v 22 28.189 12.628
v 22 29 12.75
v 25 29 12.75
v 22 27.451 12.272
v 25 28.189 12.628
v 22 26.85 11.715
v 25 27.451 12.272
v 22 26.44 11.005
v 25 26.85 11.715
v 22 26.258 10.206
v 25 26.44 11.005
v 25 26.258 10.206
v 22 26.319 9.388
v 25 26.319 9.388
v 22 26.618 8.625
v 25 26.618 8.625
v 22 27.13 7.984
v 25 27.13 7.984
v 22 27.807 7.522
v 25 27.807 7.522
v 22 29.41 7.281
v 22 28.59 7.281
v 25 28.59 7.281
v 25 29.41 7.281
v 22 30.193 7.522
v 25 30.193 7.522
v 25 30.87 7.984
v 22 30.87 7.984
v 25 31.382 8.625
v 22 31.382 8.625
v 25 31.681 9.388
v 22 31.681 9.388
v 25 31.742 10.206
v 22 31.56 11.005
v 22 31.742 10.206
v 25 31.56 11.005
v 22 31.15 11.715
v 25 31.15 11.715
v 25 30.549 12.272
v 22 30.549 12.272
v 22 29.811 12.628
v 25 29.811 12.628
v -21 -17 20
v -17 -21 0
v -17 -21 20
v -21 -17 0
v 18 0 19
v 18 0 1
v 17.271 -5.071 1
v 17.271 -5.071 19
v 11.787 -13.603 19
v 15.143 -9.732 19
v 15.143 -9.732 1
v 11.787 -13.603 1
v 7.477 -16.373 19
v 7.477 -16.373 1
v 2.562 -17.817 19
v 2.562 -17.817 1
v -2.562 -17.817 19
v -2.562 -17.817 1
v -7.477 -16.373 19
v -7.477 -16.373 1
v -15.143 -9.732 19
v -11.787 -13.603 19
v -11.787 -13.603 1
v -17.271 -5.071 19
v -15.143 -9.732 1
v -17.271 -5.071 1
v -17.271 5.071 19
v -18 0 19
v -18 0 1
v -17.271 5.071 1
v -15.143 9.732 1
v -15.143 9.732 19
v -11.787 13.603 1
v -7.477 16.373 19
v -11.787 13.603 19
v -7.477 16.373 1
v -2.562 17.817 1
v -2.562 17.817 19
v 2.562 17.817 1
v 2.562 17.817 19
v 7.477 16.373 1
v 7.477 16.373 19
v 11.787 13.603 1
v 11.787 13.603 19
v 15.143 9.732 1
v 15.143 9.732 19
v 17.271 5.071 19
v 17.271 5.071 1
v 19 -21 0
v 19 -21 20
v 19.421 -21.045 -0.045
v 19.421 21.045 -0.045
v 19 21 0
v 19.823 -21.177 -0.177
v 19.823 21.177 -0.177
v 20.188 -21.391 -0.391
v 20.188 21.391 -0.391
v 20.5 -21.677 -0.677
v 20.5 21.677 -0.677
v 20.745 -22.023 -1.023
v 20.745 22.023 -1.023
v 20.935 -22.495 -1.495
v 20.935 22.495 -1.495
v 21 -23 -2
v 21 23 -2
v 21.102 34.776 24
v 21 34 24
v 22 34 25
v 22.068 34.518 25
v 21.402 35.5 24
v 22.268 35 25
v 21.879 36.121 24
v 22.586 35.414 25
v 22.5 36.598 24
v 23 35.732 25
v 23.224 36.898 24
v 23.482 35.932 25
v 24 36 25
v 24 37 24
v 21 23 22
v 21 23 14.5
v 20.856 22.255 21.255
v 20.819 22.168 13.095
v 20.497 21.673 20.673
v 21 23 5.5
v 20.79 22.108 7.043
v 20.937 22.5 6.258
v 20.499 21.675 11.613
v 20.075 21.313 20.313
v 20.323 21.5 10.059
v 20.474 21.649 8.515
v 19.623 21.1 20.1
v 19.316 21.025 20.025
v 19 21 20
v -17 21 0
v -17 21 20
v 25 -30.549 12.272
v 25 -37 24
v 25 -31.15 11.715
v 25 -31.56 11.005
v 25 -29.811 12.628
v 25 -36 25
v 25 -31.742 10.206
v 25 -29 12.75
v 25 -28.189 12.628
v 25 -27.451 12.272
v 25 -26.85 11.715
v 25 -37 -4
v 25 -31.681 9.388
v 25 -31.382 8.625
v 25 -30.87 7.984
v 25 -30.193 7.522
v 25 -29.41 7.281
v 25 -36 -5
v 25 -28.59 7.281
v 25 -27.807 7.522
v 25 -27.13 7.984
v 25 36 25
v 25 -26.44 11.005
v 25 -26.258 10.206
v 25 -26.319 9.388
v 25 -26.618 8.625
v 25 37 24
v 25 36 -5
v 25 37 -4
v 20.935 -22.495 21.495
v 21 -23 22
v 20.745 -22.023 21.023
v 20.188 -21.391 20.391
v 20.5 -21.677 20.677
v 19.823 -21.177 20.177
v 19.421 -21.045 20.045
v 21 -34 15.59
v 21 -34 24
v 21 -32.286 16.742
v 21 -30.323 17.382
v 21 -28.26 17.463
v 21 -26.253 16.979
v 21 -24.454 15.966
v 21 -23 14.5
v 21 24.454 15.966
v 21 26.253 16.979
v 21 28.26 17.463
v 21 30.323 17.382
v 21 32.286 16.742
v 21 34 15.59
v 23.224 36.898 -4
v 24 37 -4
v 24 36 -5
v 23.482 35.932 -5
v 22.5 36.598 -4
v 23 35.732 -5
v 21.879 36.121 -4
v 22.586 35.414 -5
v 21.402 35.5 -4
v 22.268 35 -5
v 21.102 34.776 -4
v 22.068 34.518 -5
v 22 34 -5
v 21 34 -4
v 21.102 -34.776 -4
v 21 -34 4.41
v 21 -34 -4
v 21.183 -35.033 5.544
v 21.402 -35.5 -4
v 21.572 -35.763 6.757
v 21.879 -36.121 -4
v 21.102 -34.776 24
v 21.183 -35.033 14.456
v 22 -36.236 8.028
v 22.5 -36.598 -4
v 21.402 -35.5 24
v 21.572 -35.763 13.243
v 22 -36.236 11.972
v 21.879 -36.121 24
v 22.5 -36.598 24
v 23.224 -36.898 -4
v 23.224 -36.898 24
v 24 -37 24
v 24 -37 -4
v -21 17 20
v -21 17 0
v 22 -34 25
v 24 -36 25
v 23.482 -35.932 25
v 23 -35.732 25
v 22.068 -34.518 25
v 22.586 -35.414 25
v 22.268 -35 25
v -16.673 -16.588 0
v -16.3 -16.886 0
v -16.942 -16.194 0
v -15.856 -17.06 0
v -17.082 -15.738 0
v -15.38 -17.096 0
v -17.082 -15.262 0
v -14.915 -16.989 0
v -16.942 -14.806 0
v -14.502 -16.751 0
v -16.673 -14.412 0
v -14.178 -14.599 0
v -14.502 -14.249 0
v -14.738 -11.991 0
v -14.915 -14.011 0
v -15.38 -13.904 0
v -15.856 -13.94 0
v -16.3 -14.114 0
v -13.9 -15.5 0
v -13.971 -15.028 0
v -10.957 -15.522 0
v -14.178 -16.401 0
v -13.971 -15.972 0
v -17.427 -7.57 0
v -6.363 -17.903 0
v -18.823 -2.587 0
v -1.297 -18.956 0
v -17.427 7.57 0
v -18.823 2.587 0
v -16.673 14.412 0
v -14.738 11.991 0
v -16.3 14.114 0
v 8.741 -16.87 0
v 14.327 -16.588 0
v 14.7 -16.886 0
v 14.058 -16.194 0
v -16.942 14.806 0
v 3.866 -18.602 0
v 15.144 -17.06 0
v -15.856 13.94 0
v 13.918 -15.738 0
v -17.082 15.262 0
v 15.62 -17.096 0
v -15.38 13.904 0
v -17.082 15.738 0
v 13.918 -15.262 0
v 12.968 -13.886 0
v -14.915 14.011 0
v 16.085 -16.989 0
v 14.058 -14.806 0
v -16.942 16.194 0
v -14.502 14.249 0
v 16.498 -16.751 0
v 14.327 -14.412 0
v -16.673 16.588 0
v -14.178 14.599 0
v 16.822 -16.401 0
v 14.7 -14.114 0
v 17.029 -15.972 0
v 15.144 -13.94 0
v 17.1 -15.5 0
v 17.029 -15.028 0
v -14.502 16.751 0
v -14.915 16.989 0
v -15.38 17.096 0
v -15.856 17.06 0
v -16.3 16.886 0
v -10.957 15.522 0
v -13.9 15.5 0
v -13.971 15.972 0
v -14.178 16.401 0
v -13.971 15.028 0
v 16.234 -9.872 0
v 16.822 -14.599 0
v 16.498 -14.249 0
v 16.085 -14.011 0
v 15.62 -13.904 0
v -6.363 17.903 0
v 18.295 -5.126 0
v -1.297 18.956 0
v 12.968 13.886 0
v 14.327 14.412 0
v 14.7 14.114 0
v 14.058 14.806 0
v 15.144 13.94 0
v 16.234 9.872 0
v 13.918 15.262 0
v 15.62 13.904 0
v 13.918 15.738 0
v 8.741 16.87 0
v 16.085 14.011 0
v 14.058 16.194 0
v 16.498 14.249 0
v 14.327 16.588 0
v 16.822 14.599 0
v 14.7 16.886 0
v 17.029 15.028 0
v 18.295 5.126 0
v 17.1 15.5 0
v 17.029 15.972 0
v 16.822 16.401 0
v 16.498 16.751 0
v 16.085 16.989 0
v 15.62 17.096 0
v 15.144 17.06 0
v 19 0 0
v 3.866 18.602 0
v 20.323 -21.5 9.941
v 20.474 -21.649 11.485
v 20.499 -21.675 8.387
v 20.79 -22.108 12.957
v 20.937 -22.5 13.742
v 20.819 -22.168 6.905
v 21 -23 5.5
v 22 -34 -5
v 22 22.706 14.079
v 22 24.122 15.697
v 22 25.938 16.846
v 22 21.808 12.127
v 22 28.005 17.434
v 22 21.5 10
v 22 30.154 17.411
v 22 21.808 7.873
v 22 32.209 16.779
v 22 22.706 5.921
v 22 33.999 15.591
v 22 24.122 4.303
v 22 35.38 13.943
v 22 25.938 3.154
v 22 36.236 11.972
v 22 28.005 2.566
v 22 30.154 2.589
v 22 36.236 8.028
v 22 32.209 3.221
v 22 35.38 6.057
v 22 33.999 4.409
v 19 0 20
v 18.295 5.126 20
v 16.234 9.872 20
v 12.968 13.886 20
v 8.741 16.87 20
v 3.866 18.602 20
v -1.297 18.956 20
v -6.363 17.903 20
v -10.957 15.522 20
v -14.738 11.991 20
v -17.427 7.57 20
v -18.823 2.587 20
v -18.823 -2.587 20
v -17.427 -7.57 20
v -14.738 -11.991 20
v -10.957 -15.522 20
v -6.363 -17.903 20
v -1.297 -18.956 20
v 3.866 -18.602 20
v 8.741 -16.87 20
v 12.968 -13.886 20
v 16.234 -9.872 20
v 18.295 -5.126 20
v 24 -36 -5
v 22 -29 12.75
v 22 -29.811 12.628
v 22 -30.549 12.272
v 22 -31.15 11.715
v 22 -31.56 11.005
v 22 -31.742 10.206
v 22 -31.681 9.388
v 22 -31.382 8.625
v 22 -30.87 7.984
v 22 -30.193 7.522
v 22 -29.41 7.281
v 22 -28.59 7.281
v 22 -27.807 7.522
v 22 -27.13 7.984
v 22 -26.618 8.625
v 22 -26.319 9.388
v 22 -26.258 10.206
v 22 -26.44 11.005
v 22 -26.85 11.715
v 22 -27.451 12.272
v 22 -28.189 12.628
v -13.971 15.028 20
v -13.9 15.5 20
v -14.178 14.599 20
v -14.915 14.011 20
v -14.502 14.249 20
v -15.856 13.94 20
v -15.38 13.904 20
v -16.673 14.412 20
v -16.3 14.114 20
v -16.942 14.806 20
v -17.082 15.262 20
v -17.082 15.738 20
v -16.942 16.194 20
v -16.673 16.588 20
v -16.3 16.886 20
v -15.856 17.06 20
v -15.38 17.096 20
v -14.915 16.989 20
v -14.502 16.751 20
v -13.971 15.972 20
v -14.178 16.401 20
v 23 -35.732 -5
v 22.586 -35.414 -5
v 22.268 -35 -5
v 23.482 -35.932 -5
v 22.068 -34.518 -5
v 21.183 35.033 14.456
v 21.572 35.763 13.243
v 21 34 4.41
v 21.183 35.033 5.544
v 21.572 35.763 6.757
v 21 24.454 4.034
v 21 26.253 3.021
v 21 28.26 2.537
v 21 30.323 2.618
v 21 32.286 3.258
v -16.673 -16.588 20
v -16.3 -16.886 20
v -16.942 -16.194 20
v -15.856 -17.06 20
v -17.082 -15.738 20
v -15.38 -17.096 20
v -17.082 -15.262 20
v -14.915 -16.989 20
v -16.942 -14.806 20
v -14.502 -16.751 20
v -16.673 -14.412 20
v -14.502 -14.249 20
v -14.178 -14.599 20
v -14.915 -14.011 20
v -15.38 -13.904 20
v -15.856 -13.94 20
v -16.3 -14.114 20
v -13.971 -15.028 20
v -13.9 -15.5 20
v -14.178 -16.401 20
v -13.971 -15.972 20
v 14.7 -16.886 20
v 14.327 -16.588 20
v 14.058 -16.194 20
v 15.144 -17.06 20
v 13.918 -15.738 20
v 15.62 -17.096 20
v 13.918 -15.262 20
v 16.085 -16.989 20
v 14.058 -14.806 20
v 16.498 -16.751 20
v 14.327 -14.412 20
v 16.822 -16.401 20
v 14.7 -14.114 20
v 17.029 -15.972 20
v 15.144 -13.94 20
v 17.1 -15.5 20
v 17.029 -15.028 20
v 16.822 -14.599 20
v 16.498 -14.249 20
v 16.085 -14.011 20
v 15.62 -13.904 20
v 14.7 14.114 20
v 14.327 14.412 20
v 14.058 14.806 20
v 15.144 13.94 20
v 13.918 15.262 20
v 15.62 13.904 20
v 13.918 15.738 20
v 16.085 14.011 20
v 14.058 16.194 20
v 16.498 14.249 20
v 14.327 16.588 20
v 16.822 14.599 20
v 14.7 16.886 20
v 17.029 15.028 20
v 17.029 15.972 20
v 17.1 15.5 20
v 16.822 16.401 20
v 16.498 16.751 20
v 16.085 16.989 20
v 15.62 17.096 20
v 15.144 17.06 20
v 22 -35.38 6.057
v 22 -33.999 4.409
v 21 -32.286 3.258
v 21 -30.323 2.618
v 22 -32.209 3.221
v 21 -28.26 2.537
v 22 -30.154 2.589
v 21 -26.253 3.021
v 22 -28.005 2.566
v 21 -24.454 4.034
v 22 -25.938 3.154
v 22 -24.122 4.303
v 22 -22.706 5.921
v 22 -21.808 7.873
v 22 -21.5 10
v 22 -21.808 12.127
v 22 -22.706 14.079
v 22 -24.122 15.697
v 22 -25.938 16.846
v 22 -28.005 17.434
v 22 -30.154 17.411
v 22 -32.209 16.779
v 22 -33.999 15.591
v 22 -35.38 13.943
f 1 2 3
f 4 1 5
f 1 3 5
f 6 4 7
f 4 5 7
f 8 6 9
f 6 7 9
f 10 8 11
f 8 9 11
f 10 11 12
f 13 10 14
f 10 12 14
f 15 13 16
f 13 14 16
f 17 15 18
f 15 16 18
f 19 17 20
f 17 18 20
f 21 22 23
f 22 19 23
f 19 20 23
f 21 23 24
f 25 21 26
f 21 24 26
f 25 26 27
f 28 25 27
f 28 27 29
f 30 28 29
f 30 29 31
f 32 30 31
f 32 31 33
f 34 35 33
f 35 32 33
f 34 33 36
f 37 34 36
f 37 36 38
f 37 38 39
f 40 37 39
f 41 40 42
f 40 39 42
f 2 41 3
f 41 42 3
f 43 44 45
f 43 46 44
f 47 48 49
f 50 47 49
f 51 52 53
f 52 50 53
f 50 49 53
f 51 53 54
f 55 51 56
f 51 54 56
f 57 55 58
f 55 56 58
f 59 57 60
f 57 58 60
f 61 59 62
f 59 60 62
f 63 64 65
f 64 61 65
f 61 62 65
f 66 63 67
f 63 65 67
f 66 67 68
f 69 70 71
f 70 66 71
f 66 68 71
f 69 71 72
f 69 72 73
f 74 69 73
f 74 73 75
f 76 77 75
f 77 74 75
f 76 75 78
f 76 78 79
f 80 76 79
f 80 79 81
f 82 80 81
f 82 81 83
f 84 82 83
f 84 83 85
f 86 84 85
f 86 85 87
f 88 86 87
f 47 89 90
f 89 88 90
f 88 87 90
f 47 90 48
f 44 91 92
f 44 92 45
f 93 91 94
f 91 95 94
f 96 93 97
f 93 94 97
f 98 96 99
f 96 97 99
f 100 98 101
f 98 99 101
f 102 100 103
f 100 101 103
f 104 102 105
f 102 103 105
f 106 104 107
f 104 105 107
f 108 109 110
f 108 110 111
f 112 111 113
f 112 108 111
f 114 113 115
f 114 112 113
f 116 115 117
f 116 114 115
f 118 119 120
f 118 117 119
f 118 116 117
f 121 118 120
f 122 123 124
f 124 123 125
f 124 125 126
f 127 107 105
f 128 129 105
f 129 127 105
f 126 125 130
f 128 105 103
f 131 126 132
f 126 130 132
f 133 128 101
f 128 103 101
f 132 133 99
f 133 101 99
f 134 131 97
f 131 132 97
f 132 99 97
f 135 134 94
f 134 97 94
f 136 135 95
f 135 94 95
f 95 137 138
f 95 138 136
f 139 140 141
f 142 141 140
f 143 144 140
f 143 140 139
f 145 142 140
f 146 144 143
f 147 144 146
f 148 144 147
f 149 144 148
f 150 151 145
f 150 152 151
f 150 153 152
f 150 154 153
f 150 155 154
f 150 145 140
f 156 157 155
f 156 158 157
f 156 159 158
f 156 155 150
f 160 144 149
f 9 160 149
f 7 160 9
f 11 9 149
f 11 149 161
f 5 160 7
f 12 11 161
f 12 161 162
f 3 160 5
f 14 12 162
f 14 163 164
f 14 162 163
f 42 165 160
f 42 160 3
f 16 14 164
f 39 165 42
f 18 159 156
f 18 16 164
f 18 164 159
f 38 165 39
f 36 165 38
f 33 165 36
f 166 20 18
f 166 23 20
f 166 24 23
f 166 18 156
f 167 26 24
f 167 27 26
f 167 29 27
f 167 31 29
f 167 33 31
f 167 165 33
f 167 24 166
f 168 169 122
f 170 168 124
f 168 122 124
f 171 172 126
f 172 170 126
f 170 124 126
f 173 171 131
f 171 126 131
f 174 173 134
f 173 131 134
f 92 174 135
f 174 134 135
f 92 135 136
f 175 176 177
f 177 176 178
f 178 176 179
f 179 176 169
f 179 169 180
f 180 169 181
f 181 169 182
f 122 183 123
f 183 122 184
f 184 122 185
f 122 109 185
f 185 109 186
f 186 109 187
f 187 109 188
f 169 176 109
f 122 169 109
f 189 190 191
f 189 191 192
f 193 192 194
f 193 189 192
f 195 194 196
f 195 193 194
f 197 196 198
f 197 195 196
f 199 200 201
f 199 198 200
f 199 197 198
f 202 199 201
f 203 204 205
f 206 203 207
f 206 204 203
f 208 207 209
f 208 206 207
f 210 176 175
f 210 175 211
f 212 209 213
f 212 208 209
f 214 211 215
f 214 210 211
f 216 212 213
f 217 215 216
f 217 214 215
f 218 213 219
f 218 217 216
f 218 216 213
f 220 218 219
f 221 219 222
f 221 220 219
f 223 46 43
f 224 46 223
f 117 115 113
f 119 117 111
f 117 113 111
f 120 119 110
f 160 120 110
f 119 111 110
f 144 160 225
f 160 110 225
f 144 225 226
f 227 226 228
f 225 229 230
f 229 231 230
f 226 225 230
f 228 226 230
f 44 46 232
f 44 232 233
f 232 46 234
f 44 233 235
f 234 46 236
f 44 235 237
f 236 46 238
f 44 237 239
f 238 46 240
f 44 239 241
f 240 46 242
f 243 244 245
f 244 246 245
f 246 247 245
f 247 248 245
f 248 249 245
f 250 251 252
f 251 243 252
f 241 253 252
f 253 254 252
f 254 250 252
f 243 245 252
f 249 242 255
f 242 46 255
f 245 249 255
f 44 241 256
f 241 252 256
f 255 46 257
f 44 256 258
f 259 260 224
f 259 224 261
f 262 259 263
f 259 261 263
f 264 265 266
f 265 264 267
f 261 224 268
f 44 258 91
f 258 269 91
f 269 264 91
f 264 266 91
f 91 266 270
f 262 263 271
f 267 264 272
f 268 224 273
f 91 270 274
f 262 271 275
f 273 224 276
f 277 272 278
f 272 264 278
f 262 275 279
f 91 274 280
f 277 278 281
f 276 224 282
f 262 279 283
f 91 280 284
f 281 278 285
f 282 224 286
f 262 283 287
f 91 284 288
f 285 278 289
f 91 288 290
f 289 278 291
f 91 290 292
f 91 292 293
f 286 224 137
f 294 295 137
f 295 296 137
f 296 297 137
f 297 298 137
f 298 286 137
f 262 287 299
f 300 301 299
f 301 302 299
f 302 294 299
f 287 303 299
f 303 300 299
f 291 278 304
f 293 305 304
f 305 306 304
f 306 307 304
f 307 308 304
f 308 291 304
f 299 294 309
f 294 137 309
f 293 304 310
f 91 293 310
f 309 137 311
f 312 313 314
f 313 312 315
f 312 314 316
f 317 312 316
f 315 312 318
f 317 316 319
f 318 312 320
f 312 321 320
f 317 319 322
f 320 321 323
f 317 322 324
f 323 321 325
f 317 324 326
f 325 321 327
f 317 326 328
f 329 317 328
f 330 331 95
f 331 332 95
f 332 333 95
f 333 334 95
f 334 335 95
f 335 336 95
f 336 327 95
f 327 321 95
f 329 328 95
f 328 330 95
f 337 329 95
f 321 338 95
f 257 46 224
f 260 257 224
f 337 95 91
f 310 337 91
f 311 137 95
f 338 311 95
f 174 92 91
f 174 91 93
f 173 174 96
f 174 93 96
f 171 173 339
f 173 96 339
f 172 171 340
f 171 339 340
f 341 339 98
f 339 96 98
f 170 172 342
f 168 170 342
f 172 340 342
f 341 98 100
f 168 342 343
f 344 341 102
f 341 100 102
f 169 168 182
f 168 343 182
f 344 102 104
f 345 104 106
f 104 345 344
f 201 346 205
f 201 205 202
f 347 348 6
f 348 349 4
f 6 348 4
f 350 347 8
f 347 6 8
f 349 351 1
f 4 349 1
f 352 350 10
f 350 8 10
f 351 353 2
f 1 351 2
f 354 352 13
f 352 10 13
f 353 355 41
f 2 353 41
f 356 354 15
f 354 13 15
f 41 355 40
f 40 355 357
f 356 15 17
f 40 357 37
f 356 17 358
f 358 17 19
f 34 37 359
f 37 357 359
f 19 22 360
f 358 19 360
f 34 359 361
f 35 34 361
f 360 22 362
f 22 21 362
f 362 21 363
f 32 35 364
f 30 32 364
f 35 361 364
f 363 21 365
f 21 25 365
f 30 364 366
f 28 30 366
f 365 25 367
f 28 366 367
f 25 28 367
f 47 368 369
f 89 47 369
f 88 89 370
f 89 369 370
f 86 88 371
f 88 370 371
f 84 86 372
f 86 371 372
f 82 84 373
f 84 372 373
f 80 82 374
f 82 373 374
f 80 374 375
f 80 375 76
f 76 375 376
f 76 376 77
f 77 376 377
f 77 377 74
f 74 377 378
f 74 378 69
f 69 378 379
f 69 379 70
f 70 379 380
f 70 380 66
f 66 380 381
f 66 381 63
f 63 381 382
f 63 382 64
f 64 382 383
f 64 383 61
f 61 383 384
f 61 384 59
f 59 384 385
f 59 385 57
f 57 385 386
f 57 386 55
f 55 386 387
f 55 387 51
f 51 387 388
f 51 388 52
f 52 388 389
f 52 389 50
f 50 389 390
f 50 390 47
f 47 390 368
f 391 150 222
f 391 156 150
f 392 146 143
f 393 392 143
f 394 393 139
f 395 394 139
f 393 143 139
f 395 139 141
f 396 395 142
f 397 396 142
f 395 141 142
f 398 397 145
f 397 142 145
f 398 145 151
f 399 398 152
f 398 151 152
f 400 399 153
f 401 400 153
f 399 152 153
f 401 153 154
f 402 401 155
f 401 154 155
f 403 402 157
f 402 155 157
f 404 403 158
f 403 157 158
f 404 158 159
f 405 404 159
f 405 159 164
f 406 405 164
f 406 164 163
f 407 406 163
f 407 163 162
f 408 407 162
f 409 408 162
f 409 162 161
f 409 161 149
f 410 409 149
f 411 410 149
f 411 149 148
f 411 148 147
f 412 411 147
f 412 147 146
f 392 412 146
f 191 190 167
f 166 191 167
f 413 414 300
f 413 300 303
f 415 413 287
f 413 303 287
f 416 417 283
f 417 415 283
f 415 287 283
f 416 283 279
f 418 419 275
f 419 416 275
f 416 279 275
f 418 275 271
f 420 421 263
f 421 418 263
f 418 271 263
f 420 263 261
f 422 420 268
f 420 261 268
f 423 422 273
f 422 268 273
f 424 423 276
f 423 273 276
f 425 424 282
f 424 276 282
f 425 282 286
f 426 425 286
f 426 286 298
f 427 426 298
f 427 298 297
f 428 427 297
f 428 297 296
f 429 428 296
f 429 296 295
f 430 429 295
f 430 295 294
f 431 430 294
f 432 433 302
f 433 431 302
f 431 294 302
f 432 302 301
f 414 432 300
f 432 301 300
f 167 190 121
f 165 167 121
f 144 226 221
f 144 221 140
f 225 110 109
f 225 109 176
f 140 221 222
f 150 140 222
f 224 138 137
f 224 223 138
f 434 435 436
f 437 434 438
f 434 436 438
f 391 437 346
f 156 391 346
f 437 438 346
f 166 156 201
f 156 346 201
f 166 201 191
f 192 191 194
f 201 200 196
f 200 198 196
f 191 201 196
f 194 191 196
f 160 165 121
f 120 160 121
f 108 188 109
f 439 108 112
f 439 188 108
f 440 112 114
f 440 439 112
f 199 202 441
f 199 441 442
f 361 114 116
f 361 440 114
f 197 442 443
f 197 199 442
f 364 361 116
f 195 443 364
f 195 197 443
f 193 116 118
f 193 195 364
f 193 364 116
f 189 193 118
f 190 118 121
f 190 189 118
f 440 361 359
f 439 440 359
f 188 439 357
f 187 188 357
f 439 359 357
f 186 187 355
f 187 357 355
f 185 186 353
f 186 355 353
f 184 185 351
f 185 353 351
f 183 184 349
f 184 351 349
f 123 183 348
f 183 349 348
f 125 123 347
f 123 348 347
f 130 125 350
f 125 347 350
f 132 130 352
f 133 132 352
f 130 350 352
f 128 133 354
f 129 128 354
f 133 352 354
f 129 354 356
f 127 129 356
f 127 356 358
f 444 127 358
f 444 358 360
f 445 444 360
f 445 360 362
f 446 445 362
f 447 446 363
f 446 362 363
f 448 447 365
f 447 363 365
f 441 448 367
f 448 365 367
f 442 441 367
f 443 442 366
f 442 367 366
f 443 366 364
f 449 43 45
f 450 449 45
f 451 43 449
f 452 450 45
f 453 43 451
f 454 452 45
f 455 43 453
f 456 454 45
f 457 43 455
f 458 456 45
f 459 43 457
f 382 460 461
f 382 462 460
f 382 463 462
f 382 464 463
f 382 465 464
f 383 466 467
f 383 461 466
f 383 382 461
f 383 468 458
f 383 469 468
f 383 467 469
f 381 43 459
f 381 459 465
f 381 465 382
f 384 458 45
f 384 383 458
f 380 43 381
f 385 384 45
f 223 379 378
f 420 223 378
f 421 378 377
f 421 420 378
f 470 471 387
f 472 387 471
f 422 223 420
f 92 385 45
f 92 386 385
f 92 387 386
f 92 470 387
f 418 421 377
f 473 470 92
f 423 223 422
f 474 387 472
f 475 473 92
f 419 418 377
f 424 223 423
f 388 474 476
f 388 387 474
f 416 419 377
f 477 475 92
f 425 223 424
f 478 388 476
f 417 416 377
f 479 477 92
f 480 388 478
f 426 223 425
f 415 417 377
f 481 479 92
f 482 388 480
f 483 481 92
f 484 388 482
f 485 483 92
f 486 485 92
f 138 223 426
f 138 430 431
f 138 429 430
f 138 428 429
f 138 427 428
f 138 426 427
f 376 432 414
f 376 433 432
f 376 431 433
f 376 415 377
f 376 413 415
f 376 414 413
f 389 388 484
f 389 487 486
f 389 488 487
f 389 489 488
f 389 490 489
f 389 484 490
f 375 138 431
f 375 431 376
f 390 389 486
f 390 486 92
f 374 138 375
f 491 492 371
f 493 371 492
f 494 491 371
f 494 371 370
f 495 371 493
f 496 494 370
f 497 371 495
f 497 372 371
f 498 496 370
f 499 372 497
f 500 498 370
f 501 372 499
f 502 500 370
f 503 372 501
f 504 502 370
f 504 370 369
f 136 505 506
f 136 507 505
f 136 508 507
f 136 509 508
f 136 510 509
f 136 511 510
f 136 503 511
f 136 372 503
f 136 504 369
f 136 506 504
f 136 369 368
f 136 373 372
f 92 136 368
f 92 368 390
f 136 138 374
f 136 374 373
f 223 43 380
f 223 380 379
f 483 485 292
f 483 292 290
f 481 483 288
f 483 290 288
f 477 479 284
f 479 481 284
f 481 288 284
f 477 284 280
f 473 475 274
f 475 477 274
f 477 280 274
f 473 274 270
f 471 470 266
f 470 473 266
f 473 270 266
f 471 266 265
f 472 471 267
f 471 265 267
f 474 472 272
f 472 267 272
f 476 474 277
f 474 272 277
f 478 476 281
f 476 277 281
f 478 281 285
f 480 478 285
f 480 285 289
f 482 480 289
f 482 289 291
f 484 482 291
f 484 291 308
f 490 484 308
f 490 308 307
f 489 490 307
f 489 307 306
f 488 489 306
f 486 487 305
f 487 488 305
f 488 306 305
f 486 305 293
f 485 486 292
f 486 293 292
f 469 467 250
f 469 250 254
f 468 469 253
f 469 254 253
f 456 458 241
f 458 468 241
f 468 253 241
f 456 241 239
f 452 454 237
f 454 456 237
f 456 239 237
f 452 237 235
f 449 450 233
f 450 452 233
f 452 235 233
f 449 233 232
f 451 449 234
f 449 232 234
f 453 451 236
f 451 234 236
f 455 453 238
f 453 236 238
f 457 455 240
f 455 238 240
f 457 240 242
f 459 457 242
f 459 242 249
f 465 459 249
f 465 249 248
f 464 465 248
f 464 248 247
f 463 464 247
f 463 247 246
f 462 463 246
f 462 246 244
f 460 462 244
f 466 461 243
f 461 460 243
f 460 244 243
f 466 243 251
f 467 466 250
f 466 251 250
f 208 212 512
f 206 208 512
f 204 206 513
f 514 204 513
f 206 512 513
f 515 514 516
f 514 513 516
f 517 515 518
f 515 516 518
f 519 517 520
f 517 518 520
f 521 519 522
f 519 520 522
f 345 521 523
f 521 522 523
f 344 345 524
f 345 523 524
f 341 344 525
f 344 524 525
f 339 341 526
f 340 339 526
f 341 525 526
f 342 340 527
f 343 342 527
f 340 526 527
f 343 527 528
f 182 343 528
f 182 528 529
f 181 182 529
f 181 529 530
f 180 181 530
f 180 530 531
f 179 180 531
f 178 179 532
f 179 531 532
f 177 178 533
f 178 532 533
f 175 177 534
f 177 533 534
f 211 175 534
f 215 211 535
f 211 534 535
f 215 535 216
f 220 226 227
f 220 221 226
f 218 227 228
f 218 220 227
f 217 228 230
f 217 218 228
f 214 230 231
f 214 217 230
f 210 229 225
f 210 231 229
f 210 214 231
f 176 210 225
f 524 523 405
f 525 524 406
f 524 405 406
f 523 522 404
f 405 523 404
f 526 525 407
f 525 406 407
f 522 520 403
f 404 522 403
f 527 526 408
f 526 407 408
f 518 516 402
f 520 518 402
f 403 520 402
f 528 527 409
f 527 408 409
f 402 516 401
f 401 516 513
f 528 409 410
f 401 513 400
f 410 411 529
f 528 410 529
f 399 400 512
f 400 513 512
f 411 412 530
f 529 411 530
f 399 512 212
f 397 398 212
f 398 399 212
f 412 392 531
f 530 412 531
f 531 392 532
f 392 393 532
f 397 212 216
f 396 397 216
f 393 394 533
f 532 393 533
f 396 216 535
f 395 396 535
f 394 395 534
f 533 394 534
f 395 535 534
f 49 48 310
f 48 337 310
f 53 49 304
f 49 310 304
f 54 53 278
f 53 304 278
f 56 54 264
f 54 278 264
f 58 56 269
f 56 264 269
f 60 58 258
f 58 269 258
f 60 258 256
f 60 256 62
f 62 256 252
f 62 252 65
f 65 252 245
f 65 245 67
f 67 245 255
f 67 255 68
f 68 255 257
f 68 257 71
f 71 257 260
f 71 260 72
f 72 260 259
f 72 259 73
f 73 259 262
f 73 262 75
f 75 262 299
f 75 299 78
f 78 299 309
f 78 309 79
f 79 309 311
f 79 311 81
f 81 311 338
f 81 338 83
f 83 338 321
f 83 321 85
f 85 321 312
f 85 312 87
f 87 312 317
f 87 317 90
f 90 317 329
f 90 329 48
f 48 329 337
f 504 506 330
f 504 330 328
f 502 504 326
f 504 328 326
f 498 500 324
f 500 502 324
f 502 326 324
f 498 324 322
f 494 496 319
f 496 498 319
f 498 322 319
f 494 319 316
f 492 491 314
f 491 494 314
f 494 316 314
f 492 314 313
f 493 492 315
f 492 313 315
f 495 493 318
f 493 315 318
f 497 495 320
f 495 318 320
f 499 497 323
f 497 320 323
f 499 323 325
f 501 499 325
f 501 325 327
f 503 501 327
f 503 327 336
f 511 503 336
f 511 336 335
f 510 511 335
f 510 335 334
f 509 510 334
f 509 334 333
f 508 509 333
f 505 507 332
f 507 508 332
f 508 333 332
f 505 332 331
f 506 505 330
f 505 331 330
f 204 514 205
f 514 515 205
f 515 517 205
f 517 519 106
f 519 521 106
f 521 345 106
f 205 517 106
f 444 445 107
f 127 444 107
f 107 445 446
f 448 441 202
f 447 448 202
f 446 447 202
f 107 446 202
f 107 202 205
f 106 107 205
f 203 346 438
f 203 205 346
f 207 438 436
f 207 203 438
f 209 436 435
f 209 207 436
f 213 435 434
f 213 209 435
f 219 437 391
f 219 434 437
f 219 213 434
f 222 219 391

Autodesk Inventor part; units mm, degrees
ref_plane "YZ Plane" through (0, 0, 0) normal (1, 0, 0) x (0, 1, 0)
ref_plane "XZ Plane" through (0, 0, 0) normal (0, 1, 0) x (-1, 0, 0)
ref_plane "XY Plane" through (0, 0, 0) normal (0, 0, 1) x (1, 0, 0)
sketch "Skizze1" plane through (0, 0, 0) normal (0, 0, 1) x (1, 0, 0)
  line L0 (21, -21) -> (-21, -21)
  line L1 (-21, -21) -> (-21, 21)
  line L2 (-21, 21) -> (21, 21)
  line L3 (21, 21) -> (21, -21)
  line L4 (21, -21) -> (-21, 21) construction
  line L5 (-21, -21) -> (21, 21) construction
  circle A0 centre (0, 0) radius 18
  circle A1 centre (-15.5, 15.5) radius 1.6
  circle A2 centre (15.5, 15.5) radius 1.6
  circle A3 centre (15.5, -15.5) radius 1.6
  circle A4 centre (-15.5, -15.5) radius 1.6
  dimension "d0" = 42
  dimension "d1" = 42
  dimension "d2" = 36
  dimension "d3" = 31
  dimension "d4" = 15.5
  dimension "d5" = 3.2
  dimension "d6" = 3.2
  dimension "d7" = 3.2
  dimension "d8" = 3.2
extrude "Extrusion1" add sketch "Skizze1" along normal blind 20
sketch "Skizze2" plane through (21, -21, 0) normal (1, 0, 0) x (0, 0, -1)
  line L0 (-25, -16) -> (5, -16)
  line L1 (5, -16) -> (5, 58)
  line L2 (5, 58) -> (-25, 58)
  line L3 (-25, 58) -> (-25, -16)
  line L4 (-25, -16) -> (5, 58) construction
  line L5 (5, -16) -> (-25, 58) construction
  line L6 (0, 0) -> (-20, 0) projected
  line L7 (0, 42) -> (-20, 42) projected
  line L8 (0, 42) -> (0, 0) projected
  point P0 (0, 21)
  point P1 (-10, 21)
  point P2 (0, 21)
  dimension "d11" = 30
  dimension "d12" = 74
  dimension "d13" = 42
  dimension "d14" = 20
  dimension "d15" = 10
  dimension "d16" = 21
extrude "Extrusion2" add sketch "Skizze2" along normal blind 4
sketch "Skizze3" plane through (21, -21, 0) normal (-1, 0, 0) x (0, 0, 1)
  line L0 (0, 0) -> (20, 0) projected
  line L1 (25, -16) -> (-5, -16) projected
  line L2 (25, 58) -> (25, -16) projected
  point P0 (0, 21)
  point P1 (10, -8)
  dimension "d19" = 16
  dimension "d20" = 15
  dimension "d21" = 30
  dimension "d22" = 8
hole "Bohrung1" at (21, -29, 10) direction (1, 0, 0) diameter 5.5 end through all counterbore diameter 15 counterbore depth 1 clearance for "Sechskantkopfschraube DIN EN 24017" size "M5" standard "DIN"
ref_plane "Arbeitsebene1" through (21, 0, -5) normal (0, -1, 0) x (0, 0, -1)
mirror "Spiegeln1" about plane through (21, 0, -5) normal (0, -1, 0) of "Bohrung1"
chamfer "Fase1" distance 4 angle 45 2 edges at (-21, -21, 10) (-21, 21, 10)
fillet "Rundung1" radius 2 4 edges at (21, 0, 20) (21, -21, 10) (21, 21, 10) (21, 0, 0)
fillet "Rundung2" radius 3 2 edges at (21, -37, 10) (21, 37, 10)
chamfer "Fase2" distance 1 angle 45 10 edges at (21, 0, 25) (21.8787, -36.1213, 25) (24.5, -37, 25) (21.8787, 36.1213, 25) (24.5, 37, 25) (21, 0, -5) (21.8787, 36.1213, -5) (24.5, 37, -5) (21.8787, -36.1213, -5) (24.5, -37, -5)
chamfer "Fase3" distance 1 angle 45 2 edges at (-18, 0, 20) (-18, 0, 0)
equation "\"d1\" = d0"
equation "\"d6\" = d5"
equation "\"d15\" = 0.5 * d14"
equation "\"d20\" = 0.5 * d21"
equation "\"d22\" = 0.5 * d19"
properties part number "bullog_mount"
